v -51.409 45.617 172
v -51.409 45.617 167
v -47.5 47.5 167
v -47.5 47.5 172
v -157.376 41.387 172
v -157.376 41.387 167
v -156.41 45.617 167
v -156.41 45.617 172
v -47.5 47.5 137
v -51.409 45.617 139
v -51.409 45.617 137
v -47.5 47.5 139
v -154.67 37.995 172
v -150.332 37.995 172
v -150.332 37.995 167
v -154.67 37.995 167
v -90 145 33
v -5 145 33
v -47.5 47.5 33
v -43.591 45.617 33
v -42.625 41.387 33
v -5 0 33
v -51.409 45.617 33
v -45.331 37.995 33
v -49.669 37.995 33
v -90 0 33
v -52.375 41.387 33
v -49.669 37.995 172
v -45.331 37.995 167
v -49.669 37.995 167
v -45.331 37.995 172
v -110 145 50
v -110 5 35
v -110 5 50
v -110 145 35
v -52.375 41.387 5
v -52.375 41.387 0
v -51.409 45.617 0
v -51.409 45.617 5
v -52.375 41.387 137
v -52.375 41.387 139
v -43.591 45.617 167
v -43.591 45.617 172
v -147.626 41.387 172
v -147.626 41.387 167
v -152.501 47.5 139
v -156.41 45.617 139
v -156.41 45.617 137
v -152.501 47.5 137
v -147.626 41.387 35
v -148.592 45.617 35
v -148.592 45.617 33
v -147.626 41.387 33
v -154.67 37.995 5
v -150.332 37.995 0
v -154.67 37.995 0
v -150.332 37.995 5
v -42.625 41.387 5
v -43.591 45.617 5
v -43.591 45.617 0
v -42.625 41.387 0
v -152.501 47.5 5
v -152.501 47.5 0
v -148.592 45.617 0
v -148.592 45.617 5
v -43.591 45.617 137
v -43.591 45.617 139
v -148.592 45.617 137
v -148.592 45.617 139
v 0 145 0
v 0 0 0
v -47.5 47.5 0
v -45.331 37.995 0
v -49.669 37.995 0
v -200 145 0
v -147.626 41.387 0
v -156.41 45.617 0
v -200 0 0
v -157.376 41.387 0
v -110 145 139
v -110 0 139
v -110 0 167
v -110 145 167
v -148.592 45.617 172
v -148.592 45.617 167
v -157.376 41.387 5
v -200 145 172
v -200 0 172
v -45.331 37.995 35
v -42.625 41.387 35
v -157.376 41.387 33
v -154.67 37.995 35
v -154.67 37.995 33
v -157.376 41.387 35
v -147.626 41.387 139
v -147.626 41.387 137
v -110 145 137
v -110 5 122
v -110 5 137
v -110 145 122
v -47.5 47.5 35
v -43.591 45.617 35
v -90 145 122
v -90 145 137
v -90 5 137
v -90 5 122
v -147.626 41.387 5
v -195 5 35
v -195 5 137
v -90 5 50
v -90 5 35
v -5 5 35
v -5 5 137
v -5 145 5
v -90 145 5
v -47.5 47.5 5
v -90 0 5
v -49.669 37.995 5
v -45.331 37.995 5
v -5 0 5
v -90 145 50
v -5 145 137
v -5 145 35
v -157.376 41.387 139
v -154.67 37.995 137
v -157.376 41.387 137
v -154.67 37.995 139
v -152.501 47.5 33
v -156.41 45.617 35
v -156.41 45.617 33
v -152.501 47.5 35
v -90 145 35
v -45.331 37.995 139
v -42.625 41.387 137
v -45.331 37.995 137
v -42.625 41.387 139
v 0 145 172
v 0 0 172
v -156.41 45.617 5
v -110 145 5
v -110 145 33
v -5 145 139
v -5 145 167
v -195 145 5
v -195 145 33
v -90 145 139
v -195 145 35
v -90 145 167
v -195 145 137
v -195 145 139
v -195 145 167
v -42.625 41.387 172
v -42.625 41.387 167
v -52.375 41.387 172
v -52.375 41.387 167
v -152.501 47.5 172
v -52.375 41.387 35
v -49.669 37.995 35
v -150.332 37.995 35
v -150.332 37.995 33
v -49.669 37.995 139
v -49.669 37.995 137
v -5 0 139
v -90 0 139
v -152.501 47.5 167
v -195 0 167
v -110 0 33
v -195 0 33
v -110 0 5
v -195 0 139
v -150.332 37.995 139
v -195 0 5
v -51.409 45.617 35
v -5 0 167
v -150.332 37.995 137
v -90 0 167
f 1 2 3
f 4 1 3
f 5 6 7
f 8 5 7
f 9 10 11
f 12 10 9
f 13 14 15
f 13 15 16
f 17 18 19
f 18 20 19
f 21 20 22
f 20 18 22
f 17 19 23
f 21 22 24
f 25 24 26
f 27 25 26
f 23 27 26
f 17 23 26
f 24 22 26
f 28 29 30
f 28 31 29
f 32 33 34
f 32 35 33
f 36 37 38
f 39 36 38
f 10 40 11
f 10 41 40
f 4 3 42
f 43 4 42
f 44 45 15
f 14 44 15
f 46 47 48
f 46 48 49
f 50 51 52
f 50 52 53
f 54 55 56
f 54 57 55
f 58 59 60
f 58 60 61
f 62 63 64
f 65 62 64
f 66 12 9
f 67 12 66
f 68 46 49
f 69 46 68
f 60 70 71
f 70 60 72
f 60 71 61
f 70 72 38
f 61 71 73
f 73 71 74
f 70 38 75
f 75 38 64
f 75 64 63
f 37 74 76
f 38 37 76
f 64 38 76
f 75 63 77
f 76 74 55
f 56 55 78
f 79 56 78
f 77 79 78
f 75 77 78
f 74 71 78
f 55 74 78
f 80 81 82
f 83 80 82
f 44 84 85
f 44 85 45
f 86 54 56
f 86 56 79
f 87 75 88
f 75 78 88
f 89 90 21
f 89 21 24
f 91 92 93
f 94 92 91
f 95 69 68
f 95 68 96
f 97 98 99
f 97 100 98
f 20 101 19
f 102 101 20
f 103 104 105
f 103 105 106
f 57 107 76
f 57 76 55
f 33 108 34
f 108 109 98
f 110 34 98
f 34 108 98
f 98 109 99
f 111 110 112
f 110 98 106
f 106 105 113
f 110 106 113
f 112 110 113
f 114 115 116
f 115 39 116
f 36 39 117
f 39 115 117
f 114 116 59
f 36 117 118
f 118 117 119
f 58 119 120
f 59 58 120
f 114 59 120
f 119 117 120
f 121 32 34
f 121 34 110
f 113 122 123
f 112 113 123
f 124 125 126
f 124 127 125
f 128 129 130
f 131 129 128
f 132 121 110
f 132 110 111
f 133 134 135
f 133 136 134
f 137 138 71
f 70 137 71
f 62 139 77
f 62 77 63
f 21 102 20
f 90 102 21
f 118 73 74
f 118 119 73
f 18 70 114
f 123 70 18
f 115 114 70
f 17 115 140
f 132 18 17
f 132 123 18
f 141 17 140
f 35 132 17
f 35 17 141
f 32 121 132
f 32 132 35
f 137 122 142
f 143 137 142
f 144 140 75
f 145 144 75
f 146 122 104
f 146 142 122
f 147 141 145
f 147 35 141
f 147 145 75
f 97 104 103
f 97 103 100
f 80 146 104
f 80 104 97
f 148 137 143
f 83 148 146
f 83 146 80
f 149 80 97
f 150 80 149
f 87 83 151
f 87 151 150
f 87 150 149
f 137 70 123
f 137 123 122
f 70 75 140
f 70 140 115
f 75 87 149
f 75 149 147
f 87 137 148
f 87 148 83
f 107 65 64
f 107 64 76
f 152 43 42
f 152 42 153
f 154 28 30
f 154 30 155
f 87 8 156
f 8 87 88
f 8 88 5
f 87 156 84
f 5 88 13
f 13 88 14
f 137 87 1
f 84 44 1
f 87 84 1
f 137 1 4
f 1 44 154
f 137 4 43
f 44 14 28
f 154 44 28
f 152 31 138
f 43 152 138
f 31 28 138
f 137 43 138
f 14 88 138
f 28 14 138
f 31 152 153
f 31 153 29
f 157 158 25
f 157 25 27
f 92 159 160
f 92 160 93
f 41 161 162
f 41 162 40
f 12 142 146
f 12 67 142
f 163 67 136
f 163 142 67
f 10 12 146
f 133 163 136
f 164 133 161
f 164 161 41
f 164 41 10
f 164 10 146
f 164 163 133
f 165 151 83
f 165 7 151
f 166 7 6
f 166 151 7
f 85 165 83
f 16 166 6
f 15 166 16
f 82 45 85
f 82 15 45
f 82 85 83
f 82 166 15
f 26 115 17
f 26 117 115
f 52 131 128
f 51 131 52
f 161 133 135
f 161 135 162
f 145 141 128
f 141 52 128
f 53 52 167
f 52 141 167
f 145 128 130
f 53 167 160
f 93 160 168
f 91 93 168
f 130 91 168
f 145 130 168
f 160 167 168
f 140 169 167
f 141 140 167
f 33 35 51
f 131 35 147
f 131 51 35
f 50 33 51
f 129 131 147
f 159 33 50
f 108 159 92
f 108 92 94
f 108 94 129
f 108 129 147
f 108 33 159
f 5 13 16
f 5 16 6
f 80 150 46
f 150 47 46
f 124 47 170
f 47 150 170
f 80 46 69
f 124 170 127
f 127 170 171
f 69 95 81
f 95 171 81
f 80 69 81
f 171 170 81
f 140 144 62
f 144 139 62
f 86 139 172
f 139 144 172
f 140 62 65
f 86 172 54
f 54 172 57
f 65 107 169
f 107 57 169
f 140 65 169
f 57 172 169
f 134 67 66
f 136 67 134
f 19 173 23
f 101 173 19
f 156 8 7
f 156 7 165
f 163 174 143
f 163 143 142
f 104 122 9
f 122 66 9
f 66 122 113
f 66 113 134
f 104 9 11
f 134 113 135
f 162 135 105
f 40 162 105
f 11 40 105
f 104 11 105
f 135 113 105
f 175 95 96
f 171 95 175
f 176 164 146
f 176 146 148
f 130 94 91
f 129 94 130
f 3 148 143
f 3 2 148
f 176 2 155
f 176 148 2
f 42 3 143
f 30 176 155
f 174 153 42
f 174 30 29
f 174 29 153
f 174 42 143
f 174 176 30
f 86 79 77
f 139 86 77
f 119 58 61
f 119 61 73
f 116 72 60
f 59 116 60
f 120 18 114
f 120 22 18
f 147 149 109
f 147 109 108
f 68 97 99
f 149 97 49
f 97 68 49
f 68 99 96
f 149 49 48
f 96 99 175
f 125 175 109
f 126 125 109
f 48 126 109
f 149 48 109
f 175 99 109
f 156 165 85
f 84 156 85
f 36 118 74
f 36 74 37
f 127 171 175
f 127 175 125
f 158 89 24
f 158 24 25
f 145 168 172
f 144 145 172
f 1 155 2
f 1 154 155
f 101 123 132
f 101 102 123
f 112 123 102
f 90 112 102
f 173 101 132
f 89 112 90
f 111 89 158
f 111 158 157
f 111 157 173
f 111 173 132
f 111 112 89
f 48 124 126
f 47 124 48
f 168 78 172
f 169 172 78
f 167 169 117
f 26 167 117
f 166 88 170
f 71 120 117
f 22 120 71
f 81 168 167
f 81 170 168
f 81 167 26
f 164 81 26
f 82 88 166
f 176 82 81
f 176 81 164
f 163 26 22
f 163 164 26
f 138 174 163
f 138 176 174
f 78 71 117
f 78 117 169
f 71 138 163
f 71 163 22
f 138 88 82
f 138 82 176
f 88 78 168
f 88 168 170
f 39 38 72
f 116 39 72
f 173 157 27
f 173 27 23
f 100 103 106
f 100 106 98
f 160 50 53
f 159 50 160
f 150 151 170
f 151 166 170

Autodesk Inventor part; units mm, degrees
ref_plane "YZ Plane" through (0, 0, 0) normal (1, 0, 0) x (0, 1, 0)
ref_plane "XZ Plane" through (0, 0, 0) normal (0, 1, 0) x (-1, 0, 0)
ref_plane "XY Plane" through (0, 0, 0) normal (0, 0, 1) x (1, 0, 0)
sketch "Sketch1" plane through (0, 0, 0) normal (0, 1, 0) x (-1, 0, 0)
  line L0 (0, 0) -> (200, 0)
  line L1 (200, 0) -> (200, 172)
  line L2 (200, 172) -> (0, 172)
  line L3 (0, 172) -> (0, 0)
  line L4 (0, 172) -> (200, 172)
  line L5 (200, 172) -> (200, -28)
  line L6 (200, -28) -> (0, -28)
  line L7 (0, -28) -> (0, 172)
  line L8 (200, 172) -> (195, 172)
  line L9 (195, 172) -> (195, 167)
  line L10 (195, 167) -> (200, 167)
  line L11 (195, 172) -> (195, 144)
  line L12 (195, 167) -> (130, 167)
  line L13 (130, 167) -> (130, 144)
  line L14 (130, 144) -> (195, 144)
  line L15 (195, 144) -> (195, 0)
  line L16 (195, 0) -> (195, 5)
  line L17 (195, 5) -> (130, 5)
  line L18 (130, 5) -> (130, 33)
  line L19 (130, 33) -> (195, 33)
  line L20 (0, 167) -> (5, 167)
  line L21 (5, 167) -> (5, 139)
  line L22 (130, 167) -> (130, 139)
  line L23 (130, 139) -> (195, 139)
  line L24 (5, 139) -> (70, 139)
  line L25 (70, 139) -> (70, 167)
  line L26 (70, 167) -> (5, 167)
  line L27 (5, 139) -> (5, 0)
  line L28 (5, 33) -> (70, 33)
  line L29 (70, 33) -> (70, 5)
  line L30 (70, 5) -> (5, 5)
  line L31 (130, 139) -> (70, 139)
  line L32 (130, 33) -> (70, 33)
  line L33 (130, 167) -> (70, 167)
  line L34 (130, 5) -> (70, 5)
  line L35 (37.5, 33) -> (37.5, 139)
  line L36 (162.5, 33) -> (162.5, 139)
  line L37 (5, 33) -> (7, 33)
  line L38 (5, 33) -> (5, 35)
  line L39 (5, 35) -> (195, 35)
  line L40 (195, 139) -> (197, 139)
  line L41 (5, 139) -> (5, 137)
  line L42 (5, 137) -> (195, 137)
  line L43 (100, 5) -> (90, 5)
  line L44 (90, 5) -> (110, 5)
  line L45 (110, 5) -> (110, 33)
  line L46 (90, 5) -> (90, 33)
  line L47 (90, 139) -> (90, 167)
  line L48 (110, 137) -> (110, 167)
  point P0 (110, 139)
  dimension "d0" = 200
  dimension "d1" = 172
  dimension "d2" = 200
  dimension "d3" = 200
  dimension "d4" = 5
  dimension "d5" = 5
  dimension "d6" = 28
  dimension "d7" = 65
  dimension "d8" = 5
  dimension "d9" = 28
  dimension "d10" = 5
  dimension "d11" = 28
  dimension "d12" = 28
  dimension "d13" = 65
  dimension "d14" = 2
  dimension "d15" = 2
  dimension "d16" = 2
  dimension "d17" = 2
  dimension "d18" = 10
  dimension "d19" = 20
extrude "Extrusion1" add sketch "Sketch1" along normal blind 145 contours L3 L20 L21 L27 L0 | L27 L30 L34 L17 L15 L0 | L3 L2 L9 L12 L33 L26 L20 | L15 L11 L10 L1 L0 | L27 L39 L35 L28 | L2 L1 L10 L9 | L24 L35 L42 L27 | L19 L36 L39 L15 | L28 L35 L39 L36 L19 L32 | L46 L32 L45 L34 | L24 L31 L48 L42 L35 | L33 L48 L31 L47 | L42 L36 L23 L15 | L48 L31 L23 L36 L42
sketch "Sketch2" plane through (0, 0, 0) normal (0, -1, 0) x (1, 0, 0)
  line L0 (-5, 137) -> (-195, 137) projected
  line L1 (-195, 35) -> (-5, 35) projected
  line L2 (-195, 137) -> (-5, 137)
  line L3 (-5, 137) -> (-5, 35)
  line L4 (-5, 35) -> (-195, 35)
  line L5 (-195, 35) -> (-195, 137)
  point P0 (0, 0)
extrude "Extrusion2" add sketch "Sketch2" against normal blind 5
sketch "Sketch3" plane through (-195, 0, 139) normal (0, 0, 1) x (1, 0, 0)
  point P0 (195, 0)
sketch "Sketch4" plane through (0, 5, 0) normal (0, 1, 0) x (1, 0, 0)
  line L0 (-90, -33) -> (-90, -5) projected
  line L1 (-5, -33) -> (-90, -33) projected
  line L2 (-90, -33) -> (-5, -33)
  line L3 (-5, -33) -> (-47.5, -33)
  line L4 (-47.5, -33) -> (-47.5, -172)
  line L5 (-200, -172) -> (0, -172) projected
  line L6 (-109.747, -33) -> (-194.7552, -33)
  line L7 (-194.7552, -33) -> (-109.747, -33)
  line L8 (-110, -5) -> (-110, -33) projected
  line L9 (-195, -5) -> (-110, -5) projected
  line L10 (-110, -5) -> (-195, -5)
  line L11 (-195, -5) -> (-152.5, -5)
  line L12 (-152.5, -5) -> (-152.5, -172)
  line L13 (-110, -167) -> (-195, -167) projected
  point P0 (0, 0)
sketch "Sketch5" plane through (-200, 0, 172) normal (0, 0, 1) x (1, 0, 0)
  line L0 (5, 144.4425) -> (89.9982, 145)
  line L1 (0, 145) -> (200, 145) projected
  line L2 (5, 144.4425) -> (47.1963, 145)
  line L3 (47.4991, 144.7212) -> (47.4991, 0)
  line L4 (0, 0) -> (200, 0) projected
  line L5 (200, 145) -> (195, 145)
  line L6 (195, 145) -> (110, 145)
  line L7 (110, 145) -> (152.5, 145)
  line L8 (152.5, 145) -> (152.5, 0)
  line L9 (195, 5) -> (5, 5) projected
  line L10 (152.5, 5) -> (152.5, 42.5)
  line L11 (152.5, 42.5) -> (47.4991, 42.5)
  circle A0 centre (47.4991, 42.5) radius 5
  circle A1 centre (152.5, 42.5) radius 5
  line L12 (47.4991, 47.5) -> (51.4082, 45.6174)
  line L13 (51.4082, 45.6174) -> (52.3737, 41.3874)
  line L14 (52.3737, 41.3874) -> (49.6685, 37.9952)
  line L15 (49.6685, 37.9952) -> (45.3297, 37.9952)
  line L16 (45.3297, 37.9952) -> (42.6244, 41.3874)
  line L17 (42.6244, 41.3874) -> (43.5899, 45.6174)
  line L18 (43.5899, 45.6174) -> (47.4991, 47.5)
  line L19 (152.5, 47.5) -> (156.4092, 45.6174)
  line L20 (156.4092, 45.6174) -> (157.3746, 41.3874)
  line L21 (157.3746, 41.3874) -> (154.6694, 37.9952)
  line L22 (154.6694, 37.9952) -> (150.3306, 37.9952)
  line L23 (150.3306, 37.9952) -> (147.6254, 41.3874)
  line L24 (147.6254, 41.3874) -> (148.5908, 45.6174)
  line L25 (148.5908, 45.6174) -> (152.5, 47.5)
  dimension "d29" = 10
  dimension "d30" = 10
  dimension "d24" = 85
  dimension "d25" = 42.2
  dimension "d26" = 5
  dimension "d27" = 85
  dimension "d28" = 37.5
extrude "Extrusion3" cut sketch "Sketch5" against normal blind 376.75 contours L12 L13 L11 L3 | L3 L15 L16 L17 L18 | L11 L13 L14 L15 L3 | L19 L20 L21 L22 L8 | L8 L11 L24 L25 | L8 L22 L23 L24 L11
sketch "Sketch6" plane through (0, 145, 0) normal (0, 1, 0) x (1, 0, 0)
  line L0 (-110, -5) -> (-110, -33) projected
  line L1 (-110, -5) -> (-110, -162.1983)
  line L2 (-110, -162.1983) -> (-90, -162.1983)
  line L3 (-90, -167) -> (-90, -139) projected
  line L4 (-90, -162.1983) -> (-90, -32.5425)
  line L5 (-90, -32.5425) -> (-110, -32.5425)
  line L6 (-195, -35) -> (-5, -35) projected
  line L7 (-110, -35) -> (-110, -50)
  line L8 (-110, -50) -> (-90, -50)
  line L9 (-90, -50) -> (-90, -35)
  line L10 (-5, -137) -> (-195, -137) projected
  line L11 (-90, -137) -> (-90, -122)
  line L12 (-90, -122) -> (-110, -122)
  point P0 (0, 0)
  point P1 (-110, -137)
  dimension "d33" = 15
  dimension "d34" = 15
extrude "Extrusion4" add sketch "Sketch6" against normal blind 144.75 contours L6 L4 L8 L1 | L12 L4 L10 L1
